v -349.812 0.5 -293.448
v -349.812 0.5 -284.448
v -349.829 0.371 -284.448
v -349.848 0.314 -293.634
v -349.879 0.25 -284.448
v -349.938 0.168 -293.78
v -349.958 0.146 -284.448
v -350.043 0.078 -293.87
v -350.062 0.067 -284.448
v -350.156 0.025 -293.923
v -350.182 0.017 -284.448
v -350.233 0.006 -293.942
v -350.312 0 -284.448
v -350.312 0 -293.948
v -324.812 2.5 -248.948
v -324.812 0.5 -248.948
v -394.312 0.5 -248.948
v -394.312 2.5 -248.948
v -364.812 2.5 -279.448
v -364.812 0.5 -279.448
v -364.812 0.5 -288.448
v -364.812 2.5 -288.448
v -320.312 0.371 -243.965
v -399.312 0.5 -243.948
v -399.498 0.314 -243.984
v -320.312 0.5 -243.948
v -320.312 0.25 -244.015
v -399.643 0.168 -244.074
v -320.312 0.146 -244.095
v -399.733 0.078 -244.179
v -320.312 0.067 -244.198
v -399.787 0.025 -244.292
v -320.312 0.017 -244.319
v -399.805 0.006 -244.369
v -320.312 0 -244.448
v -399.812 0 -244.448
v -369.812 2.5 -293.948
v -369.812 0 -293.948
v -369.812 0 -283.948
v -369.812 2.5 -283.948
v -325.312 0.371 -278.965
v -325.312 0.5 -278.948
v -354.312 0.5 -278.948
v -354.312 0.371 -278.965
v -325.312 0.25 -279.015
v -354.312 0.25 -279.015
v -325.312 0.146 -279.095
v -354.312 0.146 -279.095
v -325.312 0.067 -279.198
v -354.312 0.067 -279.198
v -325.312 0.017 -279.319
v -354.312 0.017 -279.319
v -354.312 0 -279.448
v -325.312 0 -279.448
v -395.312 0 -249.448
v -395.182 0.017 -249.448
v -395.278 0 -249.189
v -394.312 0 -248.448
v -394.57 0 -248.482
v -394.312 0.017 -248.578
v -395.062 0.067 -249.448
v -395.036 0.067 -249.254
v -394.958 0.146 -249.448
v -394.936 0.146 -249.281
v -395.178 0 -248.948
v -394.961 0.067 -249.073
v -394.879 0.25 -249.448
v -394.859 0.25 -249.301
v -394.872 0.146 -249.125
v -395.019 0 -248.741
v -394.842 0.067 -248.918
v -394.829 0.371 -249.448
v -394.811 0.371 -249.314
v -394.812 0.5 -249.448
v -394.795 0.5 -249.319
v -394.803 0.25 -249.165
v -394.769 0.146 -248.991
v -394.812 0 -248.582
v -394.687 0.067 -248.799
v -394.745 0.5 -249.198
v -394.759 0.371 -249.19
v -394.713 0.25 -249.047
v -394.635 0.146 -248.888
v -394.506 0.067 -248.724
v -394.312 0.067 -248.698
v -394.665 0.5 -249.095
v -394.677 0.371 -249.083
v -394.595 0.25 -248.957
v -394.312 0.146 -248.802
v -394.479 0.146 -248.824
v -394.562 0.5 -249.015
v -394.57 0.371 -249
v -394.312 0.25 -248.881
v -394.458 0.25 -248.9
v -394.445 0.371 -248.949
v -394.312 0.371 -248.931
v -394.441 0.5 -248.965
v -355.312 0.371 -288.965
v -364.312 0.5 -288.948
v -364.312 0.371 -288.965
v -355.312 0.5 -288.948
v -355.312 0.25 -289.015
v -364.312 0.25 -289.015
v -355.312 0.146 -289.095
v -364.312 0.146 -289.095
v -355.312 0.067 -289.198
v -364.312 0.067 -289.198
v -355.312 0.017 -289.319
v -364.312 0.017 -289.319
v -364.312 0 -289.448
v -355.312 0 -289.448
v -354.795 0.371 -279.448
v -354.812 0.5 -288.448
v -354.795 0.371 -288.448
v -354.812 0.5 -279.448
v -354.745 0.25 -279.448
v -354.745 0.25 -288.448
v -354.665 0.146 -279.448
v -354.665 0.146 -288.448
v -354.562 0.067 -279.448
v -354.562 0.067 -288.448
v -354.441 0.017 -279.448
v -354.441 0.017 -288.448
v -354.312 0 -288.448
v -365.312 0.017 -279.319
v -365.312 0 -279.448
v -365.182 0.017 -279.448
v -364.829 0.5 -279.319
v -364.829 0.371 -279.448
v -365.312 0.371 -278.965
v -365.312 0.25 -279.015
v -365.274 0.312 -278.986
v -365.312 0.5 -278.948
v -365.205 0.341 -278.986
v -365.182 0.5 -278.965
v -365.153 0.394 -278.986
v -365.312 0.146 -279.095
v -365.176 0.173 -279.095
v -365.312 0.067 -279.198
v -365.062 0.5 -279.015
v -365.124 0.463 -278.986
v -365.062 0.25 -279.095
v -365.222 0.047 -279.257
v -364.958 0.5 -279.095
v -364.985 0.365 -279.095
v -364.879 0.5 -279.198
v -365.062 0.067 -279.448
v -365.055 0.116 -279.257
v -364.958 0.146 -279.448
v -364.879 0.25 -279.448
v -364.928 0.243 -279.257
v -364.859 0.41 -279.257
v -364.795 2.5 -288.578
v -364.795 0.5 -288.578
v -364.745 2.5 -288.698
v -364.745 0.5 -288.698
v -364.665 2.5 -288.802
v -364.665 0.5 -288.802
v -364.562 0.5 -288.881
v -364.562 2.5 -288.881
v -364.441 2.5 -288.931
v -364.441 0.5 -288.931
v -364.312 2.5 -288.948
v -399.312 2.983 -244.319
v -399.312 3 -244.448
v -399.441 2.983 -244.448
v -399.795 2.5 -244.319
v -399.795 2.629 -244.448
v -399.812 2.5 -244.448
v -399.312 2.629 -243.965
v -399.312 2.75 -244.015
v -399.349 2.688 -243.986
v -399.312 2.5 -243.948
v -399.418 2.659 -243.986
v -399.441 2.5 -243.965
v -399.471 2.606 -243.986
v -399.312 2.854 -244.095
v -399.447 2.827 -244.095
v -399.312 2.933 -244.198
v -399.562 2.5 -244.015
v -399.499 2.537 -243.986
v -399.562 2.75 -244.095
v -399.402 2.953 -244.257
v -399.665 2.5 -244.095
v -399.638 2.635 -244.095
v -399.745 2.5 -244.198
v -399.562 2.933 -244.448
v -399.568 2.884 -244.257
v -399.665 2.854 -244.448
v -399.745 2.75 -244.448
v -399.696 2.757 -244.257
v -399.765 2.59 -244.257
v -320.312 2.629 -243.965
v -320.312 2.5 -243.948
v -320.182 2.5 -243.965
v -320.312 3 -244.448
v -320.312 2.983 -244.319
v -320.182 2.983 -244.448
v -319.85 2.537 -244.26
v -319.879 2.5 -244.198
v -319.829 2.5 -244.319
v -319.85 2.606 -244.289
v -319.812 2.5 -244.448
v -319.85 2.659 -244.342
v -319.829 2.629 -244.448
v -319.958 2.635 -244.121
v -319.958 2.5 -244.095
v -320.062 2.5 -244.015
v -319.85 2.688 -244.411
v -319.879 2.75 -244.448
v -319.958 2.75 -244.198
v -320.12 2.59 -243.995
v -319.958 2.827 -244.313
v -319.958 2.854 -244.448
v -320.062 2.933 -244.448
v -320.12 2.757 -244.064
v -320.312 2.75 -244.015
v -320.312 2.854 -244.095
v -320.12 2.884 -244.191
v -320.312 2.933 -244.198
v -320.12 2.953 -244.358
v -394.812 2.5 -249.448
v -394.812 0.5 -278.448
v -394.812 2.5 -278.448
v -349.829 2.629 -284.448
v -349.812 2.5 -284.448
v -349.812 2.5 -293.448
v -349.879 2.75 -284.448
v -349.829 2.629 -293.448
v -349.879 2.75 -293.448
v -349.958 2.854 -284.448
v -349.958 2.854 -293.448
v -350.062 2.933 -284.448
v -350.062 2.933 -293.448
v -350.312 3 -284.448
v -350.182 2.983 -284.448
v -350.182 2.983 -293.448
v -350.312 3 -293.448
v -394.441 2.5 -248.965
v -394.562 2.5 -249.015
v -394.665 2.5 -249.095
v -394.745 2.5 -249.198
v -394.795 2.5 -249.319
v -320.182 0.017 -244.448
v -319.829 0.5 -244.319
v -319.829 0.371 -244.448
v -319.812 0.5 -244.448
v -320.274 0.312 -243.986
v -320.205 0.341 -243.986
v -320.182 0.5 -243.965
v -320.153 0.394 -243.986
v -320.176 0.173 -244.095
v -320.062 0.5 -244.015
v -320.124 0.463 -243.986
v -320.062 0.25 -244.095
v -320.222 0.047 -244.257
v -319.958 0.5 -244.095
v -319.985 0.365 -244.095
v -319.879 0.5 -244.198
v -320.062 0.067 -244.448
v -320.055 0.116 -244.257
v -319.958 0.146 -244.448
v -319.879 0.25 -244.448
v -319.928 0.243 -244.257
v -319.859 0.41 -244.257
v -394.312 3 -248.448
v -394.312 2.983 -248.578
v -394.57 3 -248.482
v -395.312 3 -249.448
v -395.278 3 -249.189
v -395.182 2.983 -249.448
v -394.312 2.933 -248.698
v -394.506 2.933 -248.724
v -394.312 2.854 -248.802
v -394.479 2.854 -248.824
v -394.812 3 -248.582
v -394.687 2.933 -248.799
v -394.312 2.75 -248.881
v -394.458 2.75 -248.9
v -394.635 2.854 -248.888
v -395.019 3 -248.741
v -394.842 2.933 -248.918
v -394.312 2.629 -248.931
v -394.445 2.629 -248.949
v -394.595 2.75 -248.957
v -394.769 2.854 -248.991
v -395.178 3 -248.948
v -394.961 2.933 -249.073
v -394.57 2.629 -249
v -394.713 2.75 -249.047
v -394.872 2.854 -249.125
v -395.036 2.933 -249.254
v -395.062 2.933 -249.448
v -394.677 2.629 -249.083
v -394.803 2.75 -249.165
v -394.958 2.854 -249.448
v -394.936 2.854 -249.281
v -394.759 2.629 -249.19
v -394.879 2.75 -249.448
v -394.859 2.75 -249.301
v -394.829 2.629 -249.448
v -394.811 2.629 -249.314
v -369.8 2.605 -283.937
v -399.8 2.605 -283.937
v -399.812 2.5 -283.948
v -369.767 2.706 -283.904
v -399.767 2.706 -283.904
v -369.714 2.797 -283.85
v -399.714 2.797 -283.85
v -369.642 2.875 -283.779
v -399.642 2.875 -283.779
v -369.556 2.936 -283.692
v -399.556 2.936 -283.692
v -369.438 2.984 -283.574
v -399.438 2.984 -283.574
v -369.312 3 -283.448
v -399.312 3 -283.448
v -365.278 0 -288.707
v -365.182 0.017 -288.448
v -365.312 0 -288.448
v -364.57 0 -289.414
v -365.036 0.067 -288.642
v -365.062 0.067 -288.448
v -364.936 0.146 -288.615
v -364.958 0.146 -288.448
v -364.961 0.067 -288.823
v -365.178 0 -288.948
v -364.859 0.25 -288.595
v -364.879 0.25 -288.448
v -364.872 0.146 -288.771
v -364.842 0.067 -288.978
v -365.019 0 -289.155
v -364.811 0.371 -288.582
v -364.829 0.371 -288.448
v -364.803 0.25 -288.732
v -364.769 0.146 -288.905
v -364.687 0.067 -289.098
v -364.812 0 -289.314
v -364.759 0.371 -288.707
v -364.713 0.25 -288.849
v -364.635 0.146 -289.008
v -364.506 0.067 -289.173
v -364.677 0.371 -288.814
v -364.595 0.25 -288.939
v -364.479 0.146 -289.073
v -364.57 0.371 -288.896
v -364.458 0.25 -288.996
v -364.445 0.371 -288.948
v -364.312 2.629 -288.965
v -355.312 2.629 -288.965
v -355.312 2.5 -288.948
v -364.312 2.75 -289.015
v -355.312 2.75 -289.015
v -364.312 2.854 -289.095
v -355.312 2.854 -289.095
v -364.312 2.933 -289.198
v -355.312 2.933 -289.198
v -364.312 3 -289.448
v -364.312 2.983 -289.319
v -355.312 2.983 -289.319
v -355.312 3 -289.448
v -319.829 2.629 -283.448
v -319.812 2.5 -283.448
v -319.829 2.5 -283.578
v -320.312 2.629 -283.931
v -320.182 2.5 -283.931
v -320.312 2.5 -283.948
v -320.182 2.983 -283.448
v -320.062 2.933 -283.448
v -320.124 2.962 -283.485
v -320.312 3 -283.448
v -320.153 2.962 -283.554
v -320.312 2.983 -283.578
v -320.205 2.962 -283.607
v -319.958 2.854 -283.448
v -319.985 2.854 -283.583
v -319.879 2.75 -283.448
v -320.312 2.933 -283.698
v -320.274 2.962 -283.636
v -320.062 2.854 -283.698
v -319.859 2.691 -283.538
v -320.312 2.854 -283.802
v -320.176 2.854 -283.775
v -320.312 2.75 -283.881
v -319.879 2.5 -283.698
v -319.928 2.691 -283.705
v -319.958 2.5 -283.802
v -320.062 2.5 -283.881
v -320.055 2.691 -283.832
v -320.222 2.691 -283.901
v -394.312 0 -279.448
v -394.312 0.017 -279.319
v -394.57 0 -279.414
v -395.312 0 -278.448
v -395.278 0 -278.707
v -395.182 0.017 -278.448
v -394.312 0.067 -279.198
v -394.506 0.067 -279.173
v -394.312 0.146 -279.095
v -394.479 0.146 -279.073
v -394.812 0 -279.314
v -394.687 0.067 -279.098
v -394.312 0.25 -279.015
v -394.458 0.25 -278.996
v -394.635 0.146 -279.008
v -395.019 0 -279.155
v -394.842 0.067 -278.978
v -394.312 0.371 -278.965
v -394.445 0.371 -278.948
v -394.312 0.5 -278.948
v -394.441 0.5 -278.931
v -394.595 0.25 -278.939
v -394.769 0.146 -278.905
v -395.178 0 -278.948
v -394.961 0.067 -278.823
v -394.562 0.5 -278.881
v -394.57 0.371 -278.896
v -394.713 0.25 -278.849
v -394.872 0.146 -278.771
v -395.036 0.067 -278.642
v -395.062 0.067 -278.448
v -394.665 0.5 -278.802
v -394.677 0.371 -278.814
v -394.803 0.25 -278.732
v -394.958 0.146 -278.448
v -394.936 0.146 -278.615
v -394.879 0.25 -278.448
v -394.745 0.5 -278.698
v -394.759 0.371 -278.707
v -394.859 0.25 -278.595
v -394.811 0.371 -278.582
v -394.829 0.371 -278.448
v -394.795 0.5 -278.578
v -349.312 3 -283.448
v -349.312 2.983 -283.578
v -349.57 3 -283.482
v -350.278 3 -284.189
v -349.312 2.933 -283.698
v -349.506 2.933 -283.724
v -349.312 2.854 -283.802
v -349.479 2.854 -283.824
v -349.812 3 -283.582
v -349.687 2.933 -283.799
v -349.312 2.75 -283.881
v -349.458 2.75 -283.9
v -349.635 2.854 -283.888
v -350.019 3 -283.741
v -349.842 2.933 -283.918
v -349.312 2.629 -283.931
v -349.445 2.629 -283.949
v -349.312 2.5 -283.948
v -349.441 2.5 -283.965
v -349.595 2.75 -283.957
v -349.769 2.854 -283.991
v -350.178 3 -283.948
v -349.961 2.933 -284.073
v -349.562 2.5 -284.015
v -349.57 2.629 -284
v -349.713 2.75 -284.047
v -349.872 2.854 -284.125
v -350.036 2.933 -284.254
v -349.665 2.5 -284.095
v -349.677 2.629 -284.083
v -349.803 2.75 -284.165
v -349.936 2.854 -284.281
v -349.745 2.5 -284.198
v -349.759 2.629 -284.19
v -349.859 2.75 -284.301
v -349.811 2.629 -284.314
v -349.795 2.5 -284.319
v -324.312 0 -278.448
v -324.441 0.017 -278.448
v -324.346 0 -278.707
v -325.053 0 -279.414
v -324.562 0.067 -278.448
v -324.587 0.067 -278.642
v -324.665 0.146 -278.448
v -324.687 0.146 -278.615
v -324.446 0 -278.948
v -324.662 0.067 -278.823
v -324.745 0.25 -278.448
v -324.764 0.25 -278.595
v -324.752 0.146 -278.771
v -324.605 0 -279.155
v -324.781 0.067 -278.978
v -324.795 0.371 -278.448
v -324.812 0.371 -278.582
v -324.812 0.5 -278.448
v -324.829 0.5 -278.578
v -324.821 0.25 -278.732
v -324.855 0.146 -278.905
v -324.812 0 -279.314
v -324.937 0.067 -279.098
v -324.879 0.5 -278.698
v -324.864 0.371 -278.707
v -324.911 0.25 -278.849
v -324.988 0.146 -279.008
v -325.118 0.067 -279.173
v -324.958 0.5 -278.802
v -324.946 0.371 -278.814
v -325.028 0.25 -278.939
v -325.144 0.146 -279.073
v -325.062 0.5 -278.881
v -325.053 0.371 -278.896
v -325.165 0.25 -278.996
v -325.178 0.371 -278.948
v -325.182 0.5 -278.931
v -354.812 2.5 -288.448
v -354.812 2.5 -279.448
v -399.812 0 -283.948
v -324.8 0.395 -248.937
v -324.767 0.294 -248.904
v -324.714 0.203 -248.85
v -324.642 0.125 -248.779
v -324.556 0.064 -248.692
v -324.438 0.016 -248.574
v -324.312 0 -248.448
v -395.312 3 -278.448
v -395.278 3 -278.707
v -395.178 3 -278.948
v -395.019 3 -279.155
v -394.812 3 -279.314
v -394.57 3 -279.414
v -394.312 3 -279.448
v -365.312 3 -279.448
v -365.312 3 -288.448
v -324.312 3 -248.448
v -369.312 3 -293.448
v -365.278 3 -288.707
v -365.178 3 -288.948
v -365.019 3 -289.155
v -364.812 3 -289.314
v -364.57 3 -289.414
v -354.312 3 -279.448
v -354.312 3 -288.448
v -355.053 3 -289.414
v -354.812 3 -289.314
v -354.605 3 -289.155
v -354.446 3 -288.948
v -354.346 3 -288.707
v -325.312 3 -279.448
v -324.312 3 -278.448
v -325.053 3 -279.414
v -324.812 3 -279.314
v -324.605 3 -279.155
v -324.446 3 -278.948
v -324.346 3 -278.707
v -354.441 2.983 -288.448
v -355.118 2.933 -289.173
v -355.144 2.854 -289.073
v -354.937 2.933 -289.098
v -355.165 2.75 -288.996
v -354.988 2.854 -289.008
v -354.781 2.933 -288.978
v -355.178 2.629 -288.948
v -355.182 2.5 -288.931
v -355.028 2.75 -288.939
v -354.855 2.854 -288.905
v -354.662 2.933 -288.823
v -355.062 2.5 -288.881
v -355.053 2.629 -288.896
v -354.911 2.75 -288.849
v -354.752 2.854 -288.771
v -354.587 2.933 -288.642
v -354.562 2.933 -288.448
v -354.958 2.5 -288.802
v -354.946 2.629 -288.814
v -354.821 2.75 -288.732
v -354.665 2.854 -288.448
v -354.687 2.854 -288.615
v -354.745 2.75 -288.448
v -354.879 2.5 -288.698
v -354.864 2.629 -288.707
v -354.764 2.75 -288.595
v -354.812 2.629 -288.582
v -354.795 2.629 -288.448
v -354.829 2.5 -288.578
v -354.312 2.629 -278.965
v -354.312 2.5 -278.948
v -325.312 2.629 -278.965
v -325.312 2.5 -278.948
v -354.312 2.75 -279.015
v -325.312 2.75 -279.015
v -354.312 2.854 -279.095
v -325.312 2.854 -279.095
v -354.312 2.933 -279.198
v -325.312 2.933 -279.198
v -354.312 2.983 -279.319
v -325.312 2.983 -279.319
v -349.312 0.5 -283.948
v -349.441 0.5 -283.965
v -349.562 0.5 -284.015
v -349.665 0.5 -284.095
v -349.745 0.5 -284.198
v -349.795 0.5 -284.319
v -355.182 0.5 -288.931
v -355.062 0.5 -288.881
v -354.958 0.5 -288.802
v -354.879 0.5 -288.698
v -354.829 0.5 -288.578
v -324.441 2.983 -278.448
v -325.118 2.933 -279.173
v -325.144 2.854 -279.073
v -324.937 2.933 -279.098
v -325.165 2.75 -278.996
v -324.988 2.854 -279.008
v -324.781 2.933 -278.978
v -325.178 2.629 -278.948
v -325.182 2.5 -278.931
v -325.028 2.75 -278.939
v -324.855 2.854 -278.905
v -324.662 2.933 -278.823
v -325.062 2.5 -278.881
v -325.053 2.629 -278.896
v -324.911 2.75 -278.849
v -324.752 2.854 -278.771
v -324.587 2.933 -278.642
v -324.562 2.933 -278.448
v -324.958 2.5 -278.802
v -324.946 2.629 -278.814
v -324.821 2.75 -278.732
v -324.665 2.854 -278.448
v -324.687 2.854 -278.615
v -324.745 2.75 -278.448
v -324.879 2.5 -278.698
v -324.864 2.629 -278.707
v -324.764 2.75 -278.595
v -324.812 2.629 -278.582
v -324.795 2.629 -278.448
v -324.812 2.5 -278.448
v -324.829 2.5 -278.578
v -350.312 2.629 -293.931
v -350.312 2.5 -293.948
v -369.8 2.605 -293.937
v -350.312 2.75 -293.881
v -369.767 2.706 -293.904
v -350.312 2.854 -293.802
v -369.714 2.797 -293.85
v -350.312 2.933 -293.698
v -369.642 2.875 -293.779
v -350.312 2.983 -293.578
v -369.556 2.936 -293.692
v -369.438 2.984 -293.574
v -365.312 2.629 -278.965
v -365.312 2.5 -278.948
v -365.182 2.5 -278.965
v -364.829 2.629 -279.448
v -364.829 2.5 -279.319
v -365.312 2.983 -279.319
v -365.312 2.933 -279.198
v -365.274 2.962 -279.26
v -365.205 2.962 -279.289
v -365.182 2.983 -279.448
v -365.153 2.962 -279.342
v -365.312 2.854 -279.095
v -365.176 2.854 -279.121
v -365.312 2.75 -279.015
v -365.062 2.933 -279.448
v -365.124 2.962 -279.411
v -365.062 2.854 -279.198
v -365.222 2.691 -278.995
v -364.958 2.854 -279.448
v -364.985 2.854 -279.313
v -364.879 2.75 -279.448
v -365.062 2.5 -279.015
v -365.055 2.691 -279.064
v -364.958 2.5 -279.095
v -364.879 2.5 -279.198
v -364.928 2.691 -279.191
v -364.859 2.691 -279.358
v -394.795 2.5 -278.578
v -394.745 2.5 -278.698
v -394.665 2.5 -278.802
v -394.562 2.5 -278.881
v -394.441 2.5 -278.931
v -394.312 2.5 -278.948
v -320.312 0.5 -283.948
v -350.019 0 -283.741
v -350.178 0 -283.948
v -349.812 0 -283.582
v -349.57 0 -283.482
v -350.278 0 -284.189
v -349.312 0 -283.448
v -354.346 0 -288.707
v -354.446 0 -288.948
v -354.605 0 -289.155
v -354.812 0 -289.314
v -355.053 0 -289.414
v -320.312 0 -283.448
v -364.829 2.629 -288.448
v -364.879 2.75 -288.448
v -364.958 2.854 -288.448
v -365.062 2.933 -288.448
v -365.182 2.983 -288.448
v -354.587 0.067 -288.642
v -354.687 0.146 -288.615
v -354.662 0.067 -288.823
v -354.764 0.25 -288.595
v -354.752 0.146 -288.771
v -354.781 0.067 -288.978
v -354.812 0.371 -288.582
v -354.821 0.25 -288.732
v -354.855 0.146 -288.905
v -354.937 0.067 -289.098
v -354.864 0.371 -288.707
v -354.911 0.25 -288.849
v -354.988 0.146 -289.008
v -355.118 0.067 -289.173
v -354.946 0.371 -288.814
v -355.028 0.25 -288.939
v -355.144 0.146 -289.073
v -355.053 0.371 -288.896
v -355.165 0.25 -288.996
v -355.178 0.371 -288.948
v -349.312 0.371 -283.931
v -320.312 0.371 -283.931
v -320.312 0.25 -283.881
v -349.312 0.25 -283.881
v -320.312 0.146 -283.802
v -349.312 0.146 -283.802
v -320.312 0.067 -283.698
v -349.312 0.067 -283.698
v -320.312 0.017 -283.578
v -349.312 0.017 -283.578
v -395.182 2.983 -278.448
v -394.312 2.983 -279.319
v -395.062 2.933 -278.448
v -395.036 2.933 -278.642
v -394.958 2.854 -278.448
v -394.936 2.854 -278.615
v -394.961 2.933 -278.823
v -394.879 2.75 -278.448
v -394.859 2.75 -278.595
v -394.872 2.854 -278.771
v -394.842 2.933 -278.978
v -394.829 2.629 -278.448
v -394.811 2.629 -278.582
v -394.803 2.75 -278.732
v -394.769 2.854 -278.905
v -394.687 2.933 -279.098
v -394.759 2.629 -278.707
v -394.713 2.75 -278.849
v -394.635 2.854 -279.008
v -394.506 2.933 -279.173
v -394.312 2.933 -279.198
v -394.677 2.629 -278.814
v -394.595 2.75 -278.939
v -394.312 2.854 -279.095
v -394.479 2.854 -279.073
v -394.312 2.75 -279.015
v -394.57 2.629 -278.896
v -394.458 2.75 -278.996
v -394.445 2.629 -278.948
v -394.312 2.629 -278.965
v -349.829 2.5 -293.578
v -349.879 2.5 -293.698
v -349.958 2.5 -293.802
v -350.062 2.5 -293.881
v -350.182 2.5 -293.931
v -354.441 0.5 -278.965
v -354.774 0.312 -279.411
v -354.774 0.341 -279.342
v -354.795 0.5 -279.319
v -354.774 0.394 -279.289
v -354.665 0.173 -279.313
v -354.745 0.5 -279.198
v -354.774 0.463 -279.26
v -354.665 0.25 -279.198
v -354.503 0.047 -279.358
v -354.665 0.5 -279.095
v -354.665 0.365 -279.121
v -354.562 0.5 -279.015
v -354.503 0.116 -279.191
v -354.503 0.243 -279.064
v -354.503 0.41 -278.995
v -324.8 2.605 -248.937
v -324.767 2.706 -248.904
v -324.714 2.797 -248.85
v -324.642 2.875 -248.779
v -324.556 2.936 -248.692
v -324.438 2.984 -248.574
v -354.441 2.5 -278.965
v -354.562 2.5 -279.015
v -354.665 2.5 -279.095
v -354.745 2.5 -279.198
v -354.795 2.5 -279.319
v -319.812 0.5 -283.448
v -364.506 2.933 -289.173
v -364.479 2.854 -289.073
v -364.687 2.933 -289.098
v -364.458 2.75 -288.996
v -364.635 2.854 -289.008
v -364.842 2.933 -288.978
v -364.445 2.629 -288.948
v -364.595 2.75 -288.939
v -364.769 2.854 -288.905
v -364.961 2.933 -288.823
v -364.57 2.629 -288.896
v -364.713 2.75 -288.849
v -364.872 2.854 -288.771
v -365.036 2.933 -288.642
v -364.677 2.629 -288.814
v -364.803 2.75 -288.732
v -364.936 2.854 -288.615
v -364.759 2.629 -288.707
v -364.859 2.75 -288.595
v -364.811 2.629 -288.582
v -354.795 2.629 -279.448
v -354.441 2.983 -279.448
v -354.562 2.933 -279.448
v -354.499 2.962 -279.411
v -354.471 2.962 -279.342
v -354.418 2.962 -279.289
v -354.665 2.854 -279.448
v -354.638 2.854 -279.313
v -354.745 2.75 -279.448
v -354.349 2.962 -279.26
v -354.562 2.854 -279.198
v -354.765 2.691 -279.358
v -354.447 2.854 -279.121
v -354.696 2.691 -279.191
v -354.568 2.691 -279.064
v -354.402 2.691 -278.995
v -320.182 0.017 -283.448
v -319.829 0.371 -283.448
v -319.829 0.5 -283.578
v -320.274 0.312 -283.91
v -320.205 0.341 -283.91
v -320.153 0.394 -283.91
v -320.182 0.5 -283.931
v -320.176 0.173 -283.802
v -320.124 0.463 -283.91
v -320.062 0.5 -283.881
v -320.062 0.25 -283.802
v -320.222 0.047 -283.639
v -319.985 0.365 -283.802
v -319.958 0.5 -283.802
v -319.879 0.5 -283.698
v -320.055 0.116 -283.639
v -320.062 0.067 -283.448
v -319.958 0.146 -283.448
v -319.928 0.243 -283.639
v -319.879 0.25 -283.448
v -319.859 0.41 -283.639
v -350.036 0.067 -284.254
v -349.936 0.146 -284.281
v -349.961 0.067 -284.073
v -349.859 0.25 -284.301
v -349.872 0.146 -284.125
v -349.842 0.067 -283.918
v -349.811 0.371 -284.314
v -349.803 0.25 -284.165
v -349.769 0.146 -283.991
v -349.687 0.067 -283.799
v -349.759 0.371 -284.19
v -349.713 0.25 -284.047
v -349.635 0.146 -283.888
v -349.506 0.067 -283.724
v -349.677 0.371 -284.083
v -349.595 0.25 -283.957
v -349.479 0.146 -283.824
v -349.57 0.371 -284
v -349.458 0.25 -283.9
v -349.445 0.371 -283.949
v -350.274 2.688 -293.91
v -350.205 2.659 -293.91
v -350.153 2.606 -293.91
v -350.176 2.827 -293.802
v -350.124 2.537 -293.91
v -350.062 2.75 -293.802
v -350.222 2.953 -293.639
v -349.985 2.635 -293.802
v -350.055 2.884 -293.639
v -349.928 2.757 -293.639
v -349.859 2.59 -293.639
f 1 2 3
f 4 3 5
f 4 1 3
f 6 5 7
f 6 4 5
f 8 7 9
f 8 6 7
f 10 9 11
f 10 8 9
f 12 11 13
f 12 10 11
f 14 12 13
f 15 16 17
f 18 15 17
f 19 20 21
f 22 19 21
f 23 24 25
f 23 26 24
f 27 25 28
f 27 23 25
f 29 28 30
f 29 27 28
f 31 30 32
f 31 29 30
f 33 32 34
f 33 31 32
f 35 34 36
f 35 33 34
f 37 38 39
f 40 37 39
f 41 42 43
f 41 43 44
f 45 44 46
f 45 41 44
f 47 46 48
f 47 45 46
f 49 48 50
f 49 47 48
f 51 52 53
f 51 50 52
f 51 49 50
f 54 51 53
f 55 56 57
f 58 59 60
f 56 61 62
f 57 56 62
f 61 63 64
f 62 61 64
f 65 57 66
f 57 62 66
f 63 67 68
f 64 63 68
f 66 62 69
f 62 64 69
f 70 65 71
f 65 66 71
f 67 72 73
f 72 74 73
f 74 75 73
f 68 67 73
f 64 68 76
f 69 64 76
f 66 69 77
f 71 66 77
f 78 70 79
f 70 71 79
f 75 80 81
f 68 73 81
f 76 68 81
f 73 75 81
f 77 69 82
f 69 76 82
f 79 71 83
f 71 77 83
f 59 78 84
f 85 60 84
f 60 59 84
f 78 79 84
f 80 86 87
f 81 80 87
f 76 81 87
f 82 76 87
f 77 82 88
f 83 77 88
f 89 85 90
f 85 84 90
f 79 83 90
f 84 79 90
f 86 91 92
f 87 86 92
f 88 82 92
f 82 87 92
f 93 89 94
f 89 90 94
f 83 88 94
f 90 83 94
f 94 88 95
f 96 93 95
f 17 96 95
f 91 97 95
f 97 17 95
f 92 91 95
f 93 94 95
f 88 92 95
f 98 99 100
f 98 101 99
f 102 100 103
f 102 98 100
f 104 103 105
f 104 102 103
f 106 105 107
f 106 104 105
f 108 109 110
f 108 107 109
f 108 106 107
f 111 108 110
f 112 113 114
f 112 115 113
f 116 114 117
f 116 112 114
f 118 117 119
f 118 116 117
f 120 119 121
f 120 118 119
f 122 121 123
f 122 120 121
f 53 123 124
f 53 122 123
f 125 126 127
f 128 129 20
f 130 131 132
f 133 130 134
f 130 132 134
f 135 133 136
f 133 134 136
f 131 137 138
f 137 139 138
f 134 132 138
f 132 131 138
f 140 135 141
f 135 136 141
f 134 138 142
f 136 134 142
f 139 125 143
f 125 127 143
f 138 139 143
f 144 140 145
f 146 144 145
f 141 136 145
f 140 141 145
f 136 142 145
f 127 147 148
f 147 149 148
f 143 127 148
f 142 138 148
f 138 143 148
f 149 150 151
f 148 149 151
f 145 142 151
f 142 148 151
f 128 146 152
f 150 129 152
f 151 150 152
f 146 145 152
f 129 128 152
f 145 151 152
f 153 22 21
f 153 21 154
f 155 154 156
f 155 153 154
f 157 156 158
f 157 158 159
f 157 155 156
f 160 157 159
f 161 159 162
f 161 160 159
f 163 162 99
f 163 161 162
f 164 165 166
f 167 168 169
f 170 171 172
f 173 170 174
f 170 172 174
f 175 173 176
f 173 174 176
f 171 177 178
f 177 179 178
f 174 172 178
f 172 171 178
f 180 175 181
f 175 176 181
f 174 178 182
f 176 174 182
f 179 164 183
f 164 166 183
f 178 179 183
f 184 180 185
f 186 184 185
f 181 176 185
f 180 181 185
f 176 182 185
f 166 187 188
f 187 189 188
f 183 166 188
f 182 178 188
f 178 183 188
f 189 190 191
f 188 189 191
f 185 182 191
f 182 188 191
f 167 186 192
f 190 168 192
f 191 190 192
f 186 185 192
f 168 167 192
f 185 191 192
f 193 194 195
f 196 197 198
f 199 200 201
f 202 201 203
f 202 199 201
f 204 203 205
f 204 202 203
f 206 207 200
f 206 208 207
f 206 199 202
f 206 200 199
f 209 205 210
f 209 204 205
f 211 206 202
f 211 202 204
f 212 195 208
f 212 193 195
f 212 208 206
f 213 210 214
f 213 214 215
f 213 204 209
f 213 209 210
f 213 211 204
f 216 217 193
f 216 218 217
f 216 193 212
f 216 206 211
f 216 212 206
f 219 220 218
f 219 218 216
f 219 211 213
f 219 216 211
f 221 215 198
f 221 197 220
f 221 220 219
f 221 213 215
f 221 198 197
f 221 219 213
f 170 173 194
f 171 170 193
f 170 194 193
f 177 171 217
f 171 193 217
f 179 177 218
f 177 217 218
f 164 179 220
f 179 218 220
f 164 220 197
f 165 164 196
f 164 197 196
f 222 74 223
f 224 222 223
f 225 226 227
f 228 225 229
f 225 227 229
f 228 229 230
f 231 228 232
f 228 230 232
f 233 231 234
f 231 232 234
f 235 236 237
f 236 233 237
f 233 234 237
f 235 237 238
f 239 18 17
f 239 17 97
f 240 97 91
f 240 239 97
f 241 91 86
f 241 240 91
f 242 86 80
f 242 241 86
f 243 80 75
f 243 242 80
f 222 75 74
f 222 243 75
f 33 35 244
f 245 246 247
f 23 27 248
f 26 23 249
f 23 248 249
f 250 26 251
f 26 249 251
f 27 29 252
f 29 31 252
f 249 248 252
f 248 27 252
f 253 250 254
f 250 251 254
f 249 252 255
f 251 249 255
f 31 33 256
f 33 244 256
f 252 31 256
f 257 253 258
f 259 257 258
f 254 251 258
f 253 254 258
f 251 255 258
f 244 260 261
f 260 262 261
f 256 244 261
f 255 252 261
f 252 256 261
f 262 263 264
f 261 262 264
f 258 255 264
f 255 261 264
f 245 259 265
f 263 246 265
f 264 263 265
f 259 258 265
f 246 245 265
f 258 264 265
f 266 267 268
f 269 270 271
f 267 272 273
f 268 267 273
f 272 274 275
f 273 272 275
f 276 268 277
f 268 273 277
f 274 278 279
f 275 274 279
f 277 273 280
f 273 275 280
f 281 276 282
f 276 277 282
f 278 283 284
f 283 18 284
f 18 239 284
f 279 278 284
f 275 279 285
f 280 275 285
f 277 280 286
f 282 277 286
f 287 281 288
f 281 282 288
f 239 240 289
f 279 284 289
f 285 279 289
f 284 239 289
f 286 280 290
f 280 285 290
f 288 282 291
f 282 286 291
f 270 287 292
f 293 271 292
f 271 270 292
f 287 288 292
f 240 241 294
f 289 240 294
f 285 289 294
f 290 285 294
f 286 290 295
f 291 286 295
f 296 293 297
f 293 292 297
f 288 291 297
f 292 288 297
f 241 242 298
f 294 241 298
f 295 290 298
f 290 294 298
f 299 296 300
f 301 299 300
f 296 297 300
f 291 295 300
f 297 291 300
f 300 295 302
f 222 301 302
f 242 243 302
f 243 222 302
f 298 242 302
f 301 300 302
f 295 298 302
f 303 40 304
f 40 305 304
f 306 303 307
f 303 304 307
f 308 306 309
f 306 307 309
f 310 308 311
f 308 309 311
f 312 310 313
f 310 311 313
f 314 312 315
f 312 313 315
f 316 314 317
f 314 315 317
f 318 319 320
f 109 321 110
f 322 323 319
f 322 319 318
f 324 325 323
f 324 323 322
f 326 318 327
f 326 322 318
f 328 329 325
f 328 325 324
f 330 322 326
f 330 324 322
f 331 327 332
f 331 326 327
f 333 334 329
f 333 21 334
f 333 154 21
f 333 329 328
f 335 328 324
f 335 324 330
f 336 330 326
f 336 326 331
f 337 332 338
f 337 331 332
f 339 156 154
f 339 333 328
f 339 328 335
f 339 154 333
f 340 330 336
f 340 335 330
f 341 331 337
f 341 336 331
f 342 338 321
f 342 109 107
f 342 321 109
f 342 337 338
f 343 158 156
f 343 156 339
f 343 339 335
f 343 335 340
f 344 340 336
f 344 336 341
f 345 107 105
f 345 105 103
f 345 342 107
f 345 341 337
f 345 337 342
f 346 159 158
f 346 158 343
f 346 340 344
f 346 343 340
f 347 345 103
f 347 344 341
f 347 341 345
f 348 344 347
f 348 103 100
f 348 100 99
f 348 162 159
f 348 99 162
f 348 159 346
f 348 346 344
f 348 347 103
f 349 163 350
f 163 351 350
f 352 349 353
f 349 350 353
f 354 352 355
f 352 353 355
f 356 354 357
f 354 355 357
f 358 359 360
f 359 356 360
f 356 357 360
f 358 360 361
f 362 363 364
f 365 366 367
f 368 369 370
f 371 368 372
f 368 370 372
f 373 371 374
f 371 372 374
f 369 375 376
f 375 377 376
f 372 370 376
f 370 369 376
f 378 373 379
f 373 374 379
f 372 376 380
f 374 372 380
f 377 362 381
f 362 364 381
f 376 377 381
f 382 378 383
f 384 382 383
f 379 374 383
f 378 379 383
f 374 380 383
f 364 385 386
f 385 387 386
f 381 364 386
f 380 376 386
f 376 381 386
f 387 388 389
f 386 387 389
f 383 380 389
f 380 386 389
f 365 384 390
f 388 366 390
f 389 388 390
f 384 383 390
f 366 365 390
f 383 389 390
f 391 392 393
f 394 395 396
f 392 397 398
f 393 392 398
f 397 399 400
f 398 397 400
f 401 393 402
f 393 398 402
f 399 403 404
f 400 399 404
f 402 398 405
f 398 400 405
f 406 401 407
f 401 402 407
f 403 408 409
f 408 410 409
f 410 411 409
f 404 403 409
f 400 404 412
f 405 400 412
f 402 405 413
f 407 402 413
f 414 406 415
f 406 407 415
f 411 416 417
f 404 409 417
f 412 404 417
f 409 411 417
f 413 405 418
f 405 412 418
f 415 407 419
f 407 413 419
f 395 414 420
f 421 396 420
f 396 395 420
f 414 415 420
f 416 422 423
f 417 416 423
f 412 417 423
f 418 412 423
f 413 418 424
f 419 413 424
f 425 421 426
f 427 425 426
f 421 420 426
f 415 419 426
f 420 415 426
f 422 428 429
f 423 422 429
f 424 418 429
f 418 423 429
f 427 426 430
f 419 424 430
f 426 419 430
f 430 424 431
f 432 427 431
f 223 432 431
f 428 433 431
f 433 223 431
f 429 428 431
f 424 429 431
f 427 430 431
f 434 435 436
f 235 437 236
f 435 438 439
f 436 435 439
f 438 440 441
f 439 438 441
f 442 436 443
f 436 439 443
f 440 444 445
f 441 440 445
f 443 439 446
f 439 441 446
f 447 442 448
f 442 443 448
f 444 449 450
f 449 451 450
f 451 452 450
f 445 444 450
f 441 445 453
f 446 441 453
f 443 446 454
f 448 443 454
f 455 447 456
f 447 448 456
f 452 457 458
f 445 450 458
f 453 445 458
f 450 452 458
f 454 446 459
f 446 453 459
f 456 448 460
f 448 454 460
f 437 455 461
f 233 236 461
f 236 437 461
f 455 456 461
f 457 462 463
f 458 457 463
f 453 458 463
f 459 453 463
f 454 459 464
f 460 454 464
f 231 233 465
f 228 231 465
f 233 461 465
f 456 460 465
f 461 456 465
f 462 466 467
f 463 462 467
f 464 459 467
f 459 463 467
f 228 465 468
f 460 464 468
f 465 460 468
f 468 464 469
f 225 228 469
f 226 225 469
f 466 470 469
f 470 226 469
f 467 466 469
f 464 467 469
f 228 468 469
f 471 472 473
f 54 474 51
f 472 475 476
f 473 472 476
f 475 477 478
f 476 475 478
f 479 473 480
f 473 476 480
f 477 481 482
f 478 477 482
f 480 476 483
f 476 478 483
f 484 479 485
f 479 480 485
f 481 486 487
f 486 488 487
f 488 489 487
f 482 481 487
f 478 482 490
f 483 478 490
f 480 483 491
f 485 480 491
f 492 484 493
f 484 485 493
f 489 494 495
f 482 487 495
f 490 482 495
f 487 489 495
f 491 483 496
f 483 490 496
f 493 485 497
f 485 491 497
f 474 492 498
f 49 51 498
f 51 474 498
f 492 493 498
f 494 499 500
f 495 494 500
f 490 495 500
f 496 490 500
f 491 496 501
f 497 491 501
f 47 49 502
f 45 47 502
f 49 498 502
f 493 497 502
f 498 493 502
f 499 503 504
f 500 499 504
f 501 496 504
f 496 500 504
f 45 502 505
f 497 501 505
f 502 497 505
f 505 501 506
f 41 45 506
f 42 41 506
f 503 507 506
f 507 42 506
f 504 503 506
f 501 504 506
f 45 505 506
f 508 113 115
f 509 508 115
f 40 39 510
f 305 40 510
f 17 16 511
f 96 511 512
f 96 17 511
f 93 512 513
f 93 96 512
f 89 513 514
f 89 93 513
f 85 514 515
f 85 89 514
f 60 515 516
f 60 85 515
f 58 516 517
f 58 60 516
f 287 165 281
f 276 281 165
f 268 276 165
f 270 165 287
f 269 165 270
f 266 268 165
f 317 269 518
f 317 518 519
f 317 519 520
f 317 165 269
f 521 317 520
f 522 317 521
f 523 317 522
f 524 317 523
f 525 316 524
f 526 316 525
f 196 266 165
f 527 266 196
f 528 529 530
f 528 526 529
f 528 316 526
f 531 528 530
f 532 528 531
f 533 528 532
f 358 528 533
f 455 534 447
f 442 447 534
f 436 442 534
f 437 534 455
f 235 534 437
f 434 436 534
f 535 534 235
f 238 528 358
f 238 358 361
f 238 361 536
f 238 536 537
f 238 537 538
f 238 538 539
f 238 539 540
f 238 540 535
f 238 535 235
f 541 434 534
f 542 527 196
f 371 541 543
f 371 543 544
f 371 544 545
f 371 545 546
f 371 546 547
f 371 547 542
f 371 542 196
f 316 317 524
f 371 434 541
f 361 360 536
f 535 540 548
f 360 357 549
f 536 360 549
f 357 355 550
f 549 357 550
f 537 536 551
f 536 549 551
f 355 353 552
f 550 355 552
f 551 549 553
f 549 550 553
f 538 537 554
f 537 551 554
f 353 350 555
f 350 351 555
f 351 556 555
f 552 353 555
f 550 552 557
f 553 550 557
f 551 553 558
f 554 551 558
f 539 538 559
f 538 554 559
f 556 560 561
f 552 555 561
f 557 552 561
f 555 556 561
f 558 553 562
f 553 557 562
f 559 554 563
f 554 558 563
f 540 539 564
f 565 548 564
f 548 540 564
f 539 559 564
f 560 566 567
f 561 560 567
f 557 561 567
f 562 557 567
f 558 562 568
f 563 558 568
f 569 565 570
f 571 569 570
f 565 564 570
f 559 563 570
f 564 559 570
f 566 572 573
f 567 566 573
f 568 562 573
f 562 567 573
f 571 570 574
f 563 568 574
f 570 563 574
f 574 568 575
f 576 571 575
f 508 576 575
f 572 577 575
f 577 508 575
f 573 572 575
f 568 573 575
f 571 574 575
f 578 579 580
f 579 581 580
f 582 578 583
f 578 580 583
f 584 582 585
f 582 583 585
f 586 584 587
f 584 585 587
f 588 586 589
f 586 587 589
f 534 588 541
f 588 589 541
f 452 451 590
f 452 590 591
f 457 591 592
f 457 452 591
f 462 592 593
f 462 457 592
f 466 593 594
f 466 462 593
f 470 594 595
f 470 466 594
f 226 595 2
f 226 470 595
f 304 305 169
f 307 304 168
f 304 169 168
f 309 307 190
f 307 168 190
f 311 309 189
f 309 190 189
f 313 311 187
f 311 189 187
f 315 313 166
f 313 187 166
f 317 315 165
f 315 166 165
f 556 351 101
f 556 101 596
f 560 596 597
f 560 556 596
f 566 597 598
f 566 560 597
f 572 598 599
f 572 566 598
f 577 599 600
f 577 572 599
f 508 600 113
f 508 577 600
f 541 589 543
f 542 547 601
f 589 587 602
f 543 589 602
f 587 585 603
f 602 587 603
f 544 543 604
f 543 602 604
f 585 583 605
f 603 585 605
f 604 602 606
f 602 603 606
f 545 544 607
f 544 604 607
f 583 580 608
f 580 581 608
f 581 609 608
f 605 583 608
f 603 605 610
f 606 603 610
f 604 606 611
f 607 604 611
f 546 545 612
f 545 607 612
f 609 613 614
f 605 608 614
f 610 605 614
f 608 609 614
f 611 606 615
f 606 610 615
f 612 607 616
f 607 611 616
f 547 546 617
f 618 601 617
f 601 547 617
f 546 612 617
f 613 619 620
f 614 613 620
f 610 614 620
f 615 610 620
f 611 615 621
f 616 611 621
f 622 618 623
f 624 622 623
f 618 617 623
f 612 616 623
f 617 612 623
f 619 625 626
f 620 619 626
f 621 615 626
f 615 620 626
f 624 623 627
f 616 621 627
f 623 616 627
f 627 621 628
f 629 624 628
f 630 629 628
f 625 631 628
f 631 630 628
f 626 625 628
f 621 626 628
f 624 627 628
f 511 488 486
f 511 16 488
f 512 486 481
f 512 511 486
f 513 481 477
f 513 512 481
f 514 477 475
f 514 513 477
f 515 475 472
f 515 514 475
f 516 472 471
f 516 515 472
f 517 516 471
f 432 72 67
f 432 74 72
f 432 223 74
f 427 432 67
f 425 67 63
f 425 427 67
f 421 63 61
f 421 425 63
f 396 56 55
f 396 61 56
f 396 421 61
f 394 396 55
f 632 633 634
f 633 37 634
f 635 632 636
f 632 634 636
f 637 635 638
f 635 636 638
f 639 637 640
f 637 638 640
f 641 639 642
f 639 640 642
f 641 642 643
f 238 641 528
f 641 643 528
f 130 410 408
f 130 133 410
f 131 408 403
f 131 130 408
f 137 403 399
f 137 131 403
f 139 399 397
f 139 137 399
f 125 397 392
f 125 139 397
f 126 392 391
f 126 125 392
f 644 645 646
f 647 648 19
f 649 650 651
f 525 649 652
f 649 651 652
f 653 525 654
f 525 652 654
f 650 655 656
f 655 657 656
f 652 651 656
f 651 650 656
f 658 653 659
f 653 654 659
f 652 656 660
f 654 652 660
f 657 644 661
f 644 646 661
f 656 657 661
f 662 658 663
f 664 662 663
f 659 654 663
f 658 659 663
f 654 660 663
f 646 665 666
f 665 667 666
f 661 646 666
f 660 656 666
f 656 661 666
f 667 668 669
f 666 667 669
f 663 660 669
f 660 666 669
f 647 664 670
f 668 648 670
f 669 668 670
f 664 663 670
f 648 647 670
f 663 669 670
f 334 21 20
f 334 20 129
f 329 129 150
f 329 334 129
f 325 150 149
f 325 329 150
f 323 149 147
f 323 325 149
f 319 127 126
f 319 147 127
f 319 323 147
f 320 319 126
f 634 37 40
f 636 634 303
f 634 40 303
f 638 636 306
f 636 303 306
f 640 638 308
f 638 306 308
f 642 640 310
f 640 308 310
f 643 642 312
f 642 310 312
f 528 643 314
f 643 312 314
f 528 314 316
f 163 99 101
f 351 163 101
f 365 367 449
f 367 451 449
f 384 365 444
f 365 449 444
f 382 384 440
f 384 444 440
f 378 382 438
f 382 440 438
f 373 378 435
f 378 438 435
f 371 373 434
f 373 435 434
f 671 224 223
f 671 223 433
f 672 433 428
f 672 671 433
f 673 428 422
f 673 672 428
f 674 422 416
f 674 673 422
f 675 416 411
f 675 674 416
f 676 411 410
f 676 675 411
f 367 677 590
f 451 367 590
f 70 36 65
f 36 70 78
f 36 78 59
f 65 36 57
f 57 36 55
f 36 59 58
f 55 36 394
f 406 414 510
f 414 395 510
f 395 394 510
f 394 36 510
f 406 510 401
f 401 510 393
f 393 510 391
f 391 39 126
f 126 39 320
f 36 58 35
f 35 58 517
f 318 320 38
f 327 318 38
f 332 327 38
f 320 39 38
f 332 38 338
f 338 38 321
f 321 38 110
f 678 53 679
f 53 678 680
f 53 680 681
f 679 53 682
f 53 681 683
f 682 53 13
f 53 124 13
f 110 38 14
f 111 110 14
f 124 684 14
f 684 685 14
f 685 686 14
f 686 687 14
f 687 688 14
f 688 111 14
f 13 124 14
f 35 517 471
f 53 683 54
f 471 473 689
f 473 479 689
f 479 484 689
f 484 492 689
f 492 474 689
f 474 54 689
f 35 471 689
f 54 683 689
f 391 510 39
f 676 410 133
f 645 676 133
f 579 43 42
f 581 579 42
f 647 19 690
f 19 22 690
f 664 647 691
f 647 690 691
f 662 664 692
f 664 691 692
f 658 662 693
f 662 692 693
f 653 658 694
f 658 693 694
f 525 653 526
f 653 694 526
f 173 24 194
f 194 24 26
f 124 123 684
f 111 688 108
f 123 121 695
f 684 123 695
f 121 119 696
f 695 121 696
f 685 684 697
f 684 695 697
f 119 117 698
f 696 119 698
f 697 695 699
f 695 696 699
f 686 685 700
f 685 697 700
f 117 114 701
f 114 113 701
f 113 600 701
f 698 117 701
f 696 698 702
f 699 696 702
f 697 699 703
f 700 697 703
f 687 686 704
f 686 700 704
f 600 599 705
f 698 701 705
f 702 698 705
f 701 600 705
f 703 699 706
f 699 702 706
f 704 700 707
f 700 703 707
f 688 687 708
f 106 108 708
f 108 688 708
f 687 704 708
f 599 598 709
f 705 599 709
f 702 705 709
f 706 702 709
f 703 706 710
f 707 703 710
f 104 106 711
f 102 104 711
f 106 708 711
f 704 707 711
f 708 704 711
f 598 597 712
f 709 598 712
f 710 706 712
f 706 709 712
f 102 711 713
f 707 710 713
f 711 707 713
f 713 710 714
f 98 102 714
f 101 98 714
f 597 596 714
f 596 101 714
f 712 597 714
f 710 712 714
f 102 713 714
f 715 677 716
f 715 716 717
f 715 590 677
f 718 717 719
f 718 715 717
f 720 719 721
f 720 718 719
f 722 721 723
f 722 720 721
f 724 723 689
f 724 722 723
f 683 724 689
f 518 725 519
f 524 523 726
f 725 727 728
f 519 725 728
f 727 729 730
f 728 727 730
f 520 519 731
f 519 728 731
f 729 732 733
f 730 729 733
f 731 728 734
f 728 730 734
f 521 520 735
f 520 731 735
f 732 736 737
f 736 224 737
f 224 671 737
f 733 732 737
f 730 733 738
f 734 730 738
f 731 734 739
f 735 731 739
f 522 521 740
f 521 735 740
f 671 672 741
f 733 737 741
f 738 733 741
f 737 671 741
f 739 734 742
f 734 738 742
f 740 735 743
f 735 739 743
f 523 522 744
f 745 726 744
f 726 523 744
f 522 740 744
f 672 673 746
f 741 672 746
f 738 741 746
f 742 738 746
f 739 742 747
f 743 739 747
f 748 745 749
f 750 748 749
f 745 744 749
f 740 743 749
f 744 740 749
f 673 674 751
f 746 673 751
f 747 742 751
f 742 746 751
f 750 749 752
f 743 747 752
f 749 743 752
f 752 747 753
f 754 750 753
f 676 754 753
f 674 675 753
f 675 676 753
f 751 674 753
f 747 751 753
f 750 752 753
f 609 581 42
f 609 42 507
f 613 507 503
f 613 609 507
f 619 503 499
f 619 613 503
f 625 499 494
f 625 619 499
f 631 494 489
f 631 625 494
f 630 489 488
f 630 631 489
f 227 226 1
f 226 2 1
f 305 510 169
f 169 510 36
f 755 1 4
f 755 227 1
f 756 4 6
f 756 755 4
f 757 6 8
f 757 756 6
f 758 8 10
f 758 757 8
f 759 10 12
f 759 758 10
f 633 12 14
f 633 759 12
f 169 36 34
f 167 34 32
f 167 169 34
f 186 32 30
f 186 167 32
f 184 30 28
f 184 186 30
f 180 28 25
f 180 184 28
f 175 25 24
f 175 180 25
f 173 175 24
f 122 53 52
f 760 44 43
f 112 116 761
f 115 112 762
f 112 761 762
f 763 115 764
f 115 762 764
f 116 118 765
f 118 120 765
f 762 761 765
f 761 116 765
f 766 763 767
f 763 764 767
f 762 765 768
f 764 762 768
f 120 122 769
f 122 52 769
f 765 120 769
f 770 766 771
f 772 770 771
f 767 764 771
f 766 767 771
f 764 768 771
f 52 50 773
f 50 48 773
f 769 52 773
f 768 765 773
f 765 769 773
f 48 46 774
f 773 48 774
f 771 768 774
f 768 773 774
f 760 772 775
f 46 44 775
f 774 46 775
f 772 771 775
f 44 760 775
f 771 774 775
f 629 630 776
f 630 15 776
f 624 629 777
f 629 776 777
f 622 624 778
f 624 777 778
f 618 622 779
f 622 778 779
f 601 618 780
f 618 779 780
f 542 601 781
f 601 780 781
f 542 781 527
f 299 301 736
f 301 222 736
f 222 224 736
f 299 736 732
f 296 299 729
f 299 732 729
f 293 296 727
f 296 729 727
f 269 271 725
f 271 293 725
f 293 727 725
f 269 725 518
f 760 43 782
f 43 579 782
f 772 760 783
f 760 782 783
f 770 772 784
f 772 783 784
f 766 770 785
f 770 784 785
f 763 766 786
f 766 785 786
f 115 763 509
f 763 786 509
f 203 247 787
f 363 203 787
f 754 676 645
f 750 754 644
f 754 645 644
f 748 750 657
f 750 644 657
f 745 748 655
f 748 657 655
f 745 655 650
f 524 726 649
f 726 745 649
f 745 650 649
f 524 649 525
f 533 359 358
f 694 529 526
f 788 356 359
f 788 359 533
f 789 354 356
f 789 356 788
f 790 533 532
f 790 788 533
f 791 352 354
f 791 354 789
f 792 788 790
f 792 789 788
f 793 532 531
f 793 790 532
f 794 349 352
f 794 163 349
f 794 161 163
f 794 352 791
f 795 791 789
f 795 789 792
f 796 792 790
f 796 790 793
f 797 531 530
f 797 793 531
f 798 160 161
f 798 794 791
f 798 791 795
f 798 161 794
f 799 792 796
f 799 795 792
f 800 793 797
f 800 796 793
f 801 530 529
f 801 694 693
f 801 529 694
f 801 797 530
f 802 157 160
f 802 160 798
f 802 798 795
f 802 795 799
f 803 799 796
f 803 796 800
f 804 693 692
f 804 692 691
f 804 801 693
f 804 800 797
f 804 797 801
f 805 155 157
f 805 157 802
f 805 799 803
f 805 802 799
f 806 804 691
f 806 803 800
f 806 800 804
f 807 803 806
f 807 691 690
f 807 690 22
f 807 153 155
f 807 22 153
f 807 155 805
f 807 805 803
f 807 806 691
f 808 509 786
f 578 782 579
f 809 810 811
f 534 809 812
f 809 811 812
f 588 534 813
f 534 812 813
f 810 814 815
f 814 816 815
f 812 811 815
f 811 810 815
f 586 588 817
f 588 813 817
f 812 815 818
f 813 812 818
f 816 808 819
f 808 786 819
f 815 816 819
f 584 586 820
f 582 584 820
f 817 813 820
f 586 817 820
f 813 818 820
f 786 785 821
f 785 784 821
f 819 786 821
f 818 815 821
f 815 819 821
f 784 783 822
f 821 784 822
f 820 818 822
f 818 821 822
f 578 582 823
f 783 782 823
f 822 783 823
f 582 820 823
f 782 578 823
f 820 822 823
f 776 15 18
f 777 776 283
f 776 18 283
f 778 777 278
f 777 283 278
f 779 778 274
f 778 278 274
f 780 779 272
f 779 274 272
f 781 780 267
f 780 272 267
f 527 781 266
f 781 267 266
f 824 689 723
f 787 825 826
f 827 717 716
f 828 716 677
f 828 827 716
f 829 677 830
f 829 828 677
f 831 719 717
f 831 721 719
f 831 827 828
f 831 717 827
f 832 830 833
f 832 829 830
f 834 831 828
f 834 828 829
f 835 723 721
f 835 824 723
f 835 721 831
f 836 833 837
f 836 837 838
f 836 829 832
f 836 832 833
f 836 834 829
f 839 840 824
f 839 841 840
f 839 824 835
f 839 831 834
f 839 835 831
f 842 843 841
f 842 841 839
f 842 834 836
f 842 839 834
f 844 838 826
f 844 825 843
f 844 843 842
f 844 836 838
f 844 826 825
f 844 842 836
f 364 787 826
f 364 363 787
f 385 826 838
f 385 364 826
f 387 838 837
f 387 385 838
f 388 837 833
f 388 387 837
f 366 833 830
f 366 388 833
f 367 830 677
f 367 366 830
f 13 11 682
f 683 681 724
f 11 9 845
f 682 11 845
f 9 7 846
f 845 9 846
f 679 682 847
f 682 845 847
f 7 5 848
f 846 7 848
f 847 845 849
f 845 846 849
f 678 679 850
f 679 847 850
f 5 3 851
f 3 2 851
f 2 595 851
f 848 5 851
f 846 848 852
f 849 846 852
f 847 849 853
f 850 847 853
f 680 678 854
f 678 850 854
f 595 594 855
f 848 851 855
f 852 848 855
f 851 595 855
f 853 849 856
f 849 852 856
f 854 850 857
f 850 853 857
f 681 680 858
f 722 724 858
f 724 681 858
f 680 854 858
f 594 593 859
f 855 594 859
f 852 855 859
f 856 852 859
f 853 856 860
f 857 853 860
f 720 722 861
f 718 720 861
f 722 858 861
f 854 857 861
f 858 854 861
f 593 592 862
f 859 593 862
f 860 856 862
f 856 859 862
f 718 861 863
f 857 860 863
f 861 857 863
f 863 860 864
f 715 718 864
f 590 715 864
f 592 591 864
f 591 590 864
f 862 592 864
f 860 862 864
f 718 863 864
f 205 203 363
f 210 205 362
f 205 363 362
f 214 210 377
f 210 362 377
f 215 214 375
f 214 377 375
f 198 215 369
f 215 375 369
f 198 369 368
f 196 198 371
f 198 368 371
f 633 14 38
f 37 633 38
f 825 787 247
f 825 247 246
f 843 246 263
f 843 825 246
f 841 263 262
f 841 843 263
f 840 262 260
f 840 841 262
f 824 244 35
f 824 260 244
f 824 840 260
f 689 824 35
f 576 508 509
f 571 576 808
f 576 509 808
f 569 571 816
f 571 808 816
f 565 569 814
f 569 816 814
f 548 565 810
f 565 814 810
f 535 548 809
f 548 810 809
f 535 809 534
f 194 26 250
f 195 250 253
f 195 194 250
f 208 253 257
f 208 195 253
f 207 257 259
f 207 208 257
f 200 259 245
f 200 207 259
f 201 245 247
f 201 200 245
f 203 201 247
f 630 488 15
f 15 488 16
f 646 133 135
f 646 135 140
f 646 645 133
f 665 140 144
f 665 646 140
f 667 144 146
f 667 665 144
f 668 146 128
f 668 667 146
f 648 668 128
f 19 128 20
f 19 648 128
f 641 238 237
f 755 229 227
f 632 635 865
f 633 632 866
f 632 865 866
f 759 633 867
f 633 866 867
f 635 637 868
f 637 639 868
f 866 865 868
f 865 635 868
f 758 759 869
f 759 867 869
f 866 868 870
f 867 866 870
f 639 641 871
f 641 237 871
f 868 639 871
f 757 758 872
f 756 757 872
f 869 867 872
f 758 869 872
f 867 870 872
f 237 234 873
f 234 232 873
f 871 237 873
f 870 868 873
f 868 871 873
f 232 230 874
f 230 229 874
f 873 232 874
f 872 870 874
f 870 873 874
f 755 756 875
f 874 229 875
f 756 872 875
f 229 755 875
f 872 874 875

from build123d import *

# Parameters (mm, degrees)
BOSS_EXTRUDE4_DEPTH = 3
FILLET1_R           = 0.5


with BuildPart() as part:
    # Sketch1 → Boss-Extrude4 (new body)
    with BuildSketch(Plane(origin=(0, 0, 0), x_dir=(1, 0, 0), z_dir=(0, 1, 0))):
        Polygon((-369.811676083, 283.948122897), (-399.811676083, 283.948122897), (-399.811676083, 243.948122897), (-319.811676083, 243.948122897), (-319.811676083, 283.948122897), (-349.811676083, 283.948122897), (-354.811676083, 283.948122897), (-354.811676083, 278.948122897), (-324.811676083, 278.948122897), (-324.811676083, 248.948122897), (-394.811676083, 248.948122897), (-394.811676083, 278.948122897), (-364.811676083, 278.948122897), (-364.811676083, 283.948122897), align=None)
        Polygon((-369.811676083, 293.948122897), (-369.811676083, 283.948122897), (-364.811676083, 283.948122897), (-364.811676083, 288.948122897), (-354.811676083, 288.948122897), (-354.811676083, 283.948122897), (-349.811676083, 283.948122897), (-349.811676083, 293.948122897), align=None)
    extrude(amount=BOSS_EXTRUDE4_DEPTH)

    # Fillet1
    fillet1_edges = [part.edges().sort_by_distance(p)[0] for p in [
        (-349.811676083, 3, -288.948122897),
        (-359.811676083, 3, -293.948122897),
        (-364.811676083, 0, -283.948122897),
        (-379.811676083, 0, -278.948122897),
        (-394.811676083, 0, -263.948122897),
        (-369.811676083, 3, -288.948122897),
        (-359.811676083, 0, -248.948122897),
        (-324.811676083, 0, -263.948122897),
        (-339.811676083, 0, -278.948122897),
        (-354.811676083, 0, -283.948122897),
        (-359.811676083, 0, -288.948122897),
        (-319.811676083, 0, -263.948122897),
        (-359.811676083, 0, -243.948122897),
        (-384.811676083, 3, -283.948122897),
        (-349.811676083, 0, -288.948122897),
        (-334.811676083, 0, -283.948122897),
        (-399.811676083, 3, -263.948122897),
        (-364.811676083, 1.5, -288.948122897),
        (-364.811676083, 1.5, -278.948122897),
        (-394.811676083, 1.5, -278.948122897),
        (-359.811676083, 3, -243.948122897),
        (-394.811676083, 1.5, -248.948122897),
        (-324.811676083, 1.5, -278.948122897),
        (-354.811676083, 1.5, -278.948122897),
        (-354.811676083, 1.5, -288.948122897),
        (-319.811676083, 1.5, -283.948122897),
        (-319.811676083, 1.5, -243.948122897),
        (-399.811676083, 1.5, -243.948122897),
        (-349.811676083, 1.5, -293.948122897),
        (-349.811676083, 1.5, -283.948122897),
        (-319.811676083, 3, -263.948122897),
        (-359.811676083, 3, -288.948122897),
        (-354.811676083, 3, -283.948122897),
        (-339.811676083, 3, -278.948122897),
        (-334.811676083, 3, -283.948122897),
        (-324.811676083, 3, -263.948122897),
        (-359.811676083, 3, -248.948122897),
        (-394.811676083, 3, -263.948122897),
        (-379.811676083, 3, -278.948122897),
        (-364.811676083, 3, -283.948122897),
    ]]
    fillet(fillet1_edges, radius=FILLET1_R)


solid = part.part
